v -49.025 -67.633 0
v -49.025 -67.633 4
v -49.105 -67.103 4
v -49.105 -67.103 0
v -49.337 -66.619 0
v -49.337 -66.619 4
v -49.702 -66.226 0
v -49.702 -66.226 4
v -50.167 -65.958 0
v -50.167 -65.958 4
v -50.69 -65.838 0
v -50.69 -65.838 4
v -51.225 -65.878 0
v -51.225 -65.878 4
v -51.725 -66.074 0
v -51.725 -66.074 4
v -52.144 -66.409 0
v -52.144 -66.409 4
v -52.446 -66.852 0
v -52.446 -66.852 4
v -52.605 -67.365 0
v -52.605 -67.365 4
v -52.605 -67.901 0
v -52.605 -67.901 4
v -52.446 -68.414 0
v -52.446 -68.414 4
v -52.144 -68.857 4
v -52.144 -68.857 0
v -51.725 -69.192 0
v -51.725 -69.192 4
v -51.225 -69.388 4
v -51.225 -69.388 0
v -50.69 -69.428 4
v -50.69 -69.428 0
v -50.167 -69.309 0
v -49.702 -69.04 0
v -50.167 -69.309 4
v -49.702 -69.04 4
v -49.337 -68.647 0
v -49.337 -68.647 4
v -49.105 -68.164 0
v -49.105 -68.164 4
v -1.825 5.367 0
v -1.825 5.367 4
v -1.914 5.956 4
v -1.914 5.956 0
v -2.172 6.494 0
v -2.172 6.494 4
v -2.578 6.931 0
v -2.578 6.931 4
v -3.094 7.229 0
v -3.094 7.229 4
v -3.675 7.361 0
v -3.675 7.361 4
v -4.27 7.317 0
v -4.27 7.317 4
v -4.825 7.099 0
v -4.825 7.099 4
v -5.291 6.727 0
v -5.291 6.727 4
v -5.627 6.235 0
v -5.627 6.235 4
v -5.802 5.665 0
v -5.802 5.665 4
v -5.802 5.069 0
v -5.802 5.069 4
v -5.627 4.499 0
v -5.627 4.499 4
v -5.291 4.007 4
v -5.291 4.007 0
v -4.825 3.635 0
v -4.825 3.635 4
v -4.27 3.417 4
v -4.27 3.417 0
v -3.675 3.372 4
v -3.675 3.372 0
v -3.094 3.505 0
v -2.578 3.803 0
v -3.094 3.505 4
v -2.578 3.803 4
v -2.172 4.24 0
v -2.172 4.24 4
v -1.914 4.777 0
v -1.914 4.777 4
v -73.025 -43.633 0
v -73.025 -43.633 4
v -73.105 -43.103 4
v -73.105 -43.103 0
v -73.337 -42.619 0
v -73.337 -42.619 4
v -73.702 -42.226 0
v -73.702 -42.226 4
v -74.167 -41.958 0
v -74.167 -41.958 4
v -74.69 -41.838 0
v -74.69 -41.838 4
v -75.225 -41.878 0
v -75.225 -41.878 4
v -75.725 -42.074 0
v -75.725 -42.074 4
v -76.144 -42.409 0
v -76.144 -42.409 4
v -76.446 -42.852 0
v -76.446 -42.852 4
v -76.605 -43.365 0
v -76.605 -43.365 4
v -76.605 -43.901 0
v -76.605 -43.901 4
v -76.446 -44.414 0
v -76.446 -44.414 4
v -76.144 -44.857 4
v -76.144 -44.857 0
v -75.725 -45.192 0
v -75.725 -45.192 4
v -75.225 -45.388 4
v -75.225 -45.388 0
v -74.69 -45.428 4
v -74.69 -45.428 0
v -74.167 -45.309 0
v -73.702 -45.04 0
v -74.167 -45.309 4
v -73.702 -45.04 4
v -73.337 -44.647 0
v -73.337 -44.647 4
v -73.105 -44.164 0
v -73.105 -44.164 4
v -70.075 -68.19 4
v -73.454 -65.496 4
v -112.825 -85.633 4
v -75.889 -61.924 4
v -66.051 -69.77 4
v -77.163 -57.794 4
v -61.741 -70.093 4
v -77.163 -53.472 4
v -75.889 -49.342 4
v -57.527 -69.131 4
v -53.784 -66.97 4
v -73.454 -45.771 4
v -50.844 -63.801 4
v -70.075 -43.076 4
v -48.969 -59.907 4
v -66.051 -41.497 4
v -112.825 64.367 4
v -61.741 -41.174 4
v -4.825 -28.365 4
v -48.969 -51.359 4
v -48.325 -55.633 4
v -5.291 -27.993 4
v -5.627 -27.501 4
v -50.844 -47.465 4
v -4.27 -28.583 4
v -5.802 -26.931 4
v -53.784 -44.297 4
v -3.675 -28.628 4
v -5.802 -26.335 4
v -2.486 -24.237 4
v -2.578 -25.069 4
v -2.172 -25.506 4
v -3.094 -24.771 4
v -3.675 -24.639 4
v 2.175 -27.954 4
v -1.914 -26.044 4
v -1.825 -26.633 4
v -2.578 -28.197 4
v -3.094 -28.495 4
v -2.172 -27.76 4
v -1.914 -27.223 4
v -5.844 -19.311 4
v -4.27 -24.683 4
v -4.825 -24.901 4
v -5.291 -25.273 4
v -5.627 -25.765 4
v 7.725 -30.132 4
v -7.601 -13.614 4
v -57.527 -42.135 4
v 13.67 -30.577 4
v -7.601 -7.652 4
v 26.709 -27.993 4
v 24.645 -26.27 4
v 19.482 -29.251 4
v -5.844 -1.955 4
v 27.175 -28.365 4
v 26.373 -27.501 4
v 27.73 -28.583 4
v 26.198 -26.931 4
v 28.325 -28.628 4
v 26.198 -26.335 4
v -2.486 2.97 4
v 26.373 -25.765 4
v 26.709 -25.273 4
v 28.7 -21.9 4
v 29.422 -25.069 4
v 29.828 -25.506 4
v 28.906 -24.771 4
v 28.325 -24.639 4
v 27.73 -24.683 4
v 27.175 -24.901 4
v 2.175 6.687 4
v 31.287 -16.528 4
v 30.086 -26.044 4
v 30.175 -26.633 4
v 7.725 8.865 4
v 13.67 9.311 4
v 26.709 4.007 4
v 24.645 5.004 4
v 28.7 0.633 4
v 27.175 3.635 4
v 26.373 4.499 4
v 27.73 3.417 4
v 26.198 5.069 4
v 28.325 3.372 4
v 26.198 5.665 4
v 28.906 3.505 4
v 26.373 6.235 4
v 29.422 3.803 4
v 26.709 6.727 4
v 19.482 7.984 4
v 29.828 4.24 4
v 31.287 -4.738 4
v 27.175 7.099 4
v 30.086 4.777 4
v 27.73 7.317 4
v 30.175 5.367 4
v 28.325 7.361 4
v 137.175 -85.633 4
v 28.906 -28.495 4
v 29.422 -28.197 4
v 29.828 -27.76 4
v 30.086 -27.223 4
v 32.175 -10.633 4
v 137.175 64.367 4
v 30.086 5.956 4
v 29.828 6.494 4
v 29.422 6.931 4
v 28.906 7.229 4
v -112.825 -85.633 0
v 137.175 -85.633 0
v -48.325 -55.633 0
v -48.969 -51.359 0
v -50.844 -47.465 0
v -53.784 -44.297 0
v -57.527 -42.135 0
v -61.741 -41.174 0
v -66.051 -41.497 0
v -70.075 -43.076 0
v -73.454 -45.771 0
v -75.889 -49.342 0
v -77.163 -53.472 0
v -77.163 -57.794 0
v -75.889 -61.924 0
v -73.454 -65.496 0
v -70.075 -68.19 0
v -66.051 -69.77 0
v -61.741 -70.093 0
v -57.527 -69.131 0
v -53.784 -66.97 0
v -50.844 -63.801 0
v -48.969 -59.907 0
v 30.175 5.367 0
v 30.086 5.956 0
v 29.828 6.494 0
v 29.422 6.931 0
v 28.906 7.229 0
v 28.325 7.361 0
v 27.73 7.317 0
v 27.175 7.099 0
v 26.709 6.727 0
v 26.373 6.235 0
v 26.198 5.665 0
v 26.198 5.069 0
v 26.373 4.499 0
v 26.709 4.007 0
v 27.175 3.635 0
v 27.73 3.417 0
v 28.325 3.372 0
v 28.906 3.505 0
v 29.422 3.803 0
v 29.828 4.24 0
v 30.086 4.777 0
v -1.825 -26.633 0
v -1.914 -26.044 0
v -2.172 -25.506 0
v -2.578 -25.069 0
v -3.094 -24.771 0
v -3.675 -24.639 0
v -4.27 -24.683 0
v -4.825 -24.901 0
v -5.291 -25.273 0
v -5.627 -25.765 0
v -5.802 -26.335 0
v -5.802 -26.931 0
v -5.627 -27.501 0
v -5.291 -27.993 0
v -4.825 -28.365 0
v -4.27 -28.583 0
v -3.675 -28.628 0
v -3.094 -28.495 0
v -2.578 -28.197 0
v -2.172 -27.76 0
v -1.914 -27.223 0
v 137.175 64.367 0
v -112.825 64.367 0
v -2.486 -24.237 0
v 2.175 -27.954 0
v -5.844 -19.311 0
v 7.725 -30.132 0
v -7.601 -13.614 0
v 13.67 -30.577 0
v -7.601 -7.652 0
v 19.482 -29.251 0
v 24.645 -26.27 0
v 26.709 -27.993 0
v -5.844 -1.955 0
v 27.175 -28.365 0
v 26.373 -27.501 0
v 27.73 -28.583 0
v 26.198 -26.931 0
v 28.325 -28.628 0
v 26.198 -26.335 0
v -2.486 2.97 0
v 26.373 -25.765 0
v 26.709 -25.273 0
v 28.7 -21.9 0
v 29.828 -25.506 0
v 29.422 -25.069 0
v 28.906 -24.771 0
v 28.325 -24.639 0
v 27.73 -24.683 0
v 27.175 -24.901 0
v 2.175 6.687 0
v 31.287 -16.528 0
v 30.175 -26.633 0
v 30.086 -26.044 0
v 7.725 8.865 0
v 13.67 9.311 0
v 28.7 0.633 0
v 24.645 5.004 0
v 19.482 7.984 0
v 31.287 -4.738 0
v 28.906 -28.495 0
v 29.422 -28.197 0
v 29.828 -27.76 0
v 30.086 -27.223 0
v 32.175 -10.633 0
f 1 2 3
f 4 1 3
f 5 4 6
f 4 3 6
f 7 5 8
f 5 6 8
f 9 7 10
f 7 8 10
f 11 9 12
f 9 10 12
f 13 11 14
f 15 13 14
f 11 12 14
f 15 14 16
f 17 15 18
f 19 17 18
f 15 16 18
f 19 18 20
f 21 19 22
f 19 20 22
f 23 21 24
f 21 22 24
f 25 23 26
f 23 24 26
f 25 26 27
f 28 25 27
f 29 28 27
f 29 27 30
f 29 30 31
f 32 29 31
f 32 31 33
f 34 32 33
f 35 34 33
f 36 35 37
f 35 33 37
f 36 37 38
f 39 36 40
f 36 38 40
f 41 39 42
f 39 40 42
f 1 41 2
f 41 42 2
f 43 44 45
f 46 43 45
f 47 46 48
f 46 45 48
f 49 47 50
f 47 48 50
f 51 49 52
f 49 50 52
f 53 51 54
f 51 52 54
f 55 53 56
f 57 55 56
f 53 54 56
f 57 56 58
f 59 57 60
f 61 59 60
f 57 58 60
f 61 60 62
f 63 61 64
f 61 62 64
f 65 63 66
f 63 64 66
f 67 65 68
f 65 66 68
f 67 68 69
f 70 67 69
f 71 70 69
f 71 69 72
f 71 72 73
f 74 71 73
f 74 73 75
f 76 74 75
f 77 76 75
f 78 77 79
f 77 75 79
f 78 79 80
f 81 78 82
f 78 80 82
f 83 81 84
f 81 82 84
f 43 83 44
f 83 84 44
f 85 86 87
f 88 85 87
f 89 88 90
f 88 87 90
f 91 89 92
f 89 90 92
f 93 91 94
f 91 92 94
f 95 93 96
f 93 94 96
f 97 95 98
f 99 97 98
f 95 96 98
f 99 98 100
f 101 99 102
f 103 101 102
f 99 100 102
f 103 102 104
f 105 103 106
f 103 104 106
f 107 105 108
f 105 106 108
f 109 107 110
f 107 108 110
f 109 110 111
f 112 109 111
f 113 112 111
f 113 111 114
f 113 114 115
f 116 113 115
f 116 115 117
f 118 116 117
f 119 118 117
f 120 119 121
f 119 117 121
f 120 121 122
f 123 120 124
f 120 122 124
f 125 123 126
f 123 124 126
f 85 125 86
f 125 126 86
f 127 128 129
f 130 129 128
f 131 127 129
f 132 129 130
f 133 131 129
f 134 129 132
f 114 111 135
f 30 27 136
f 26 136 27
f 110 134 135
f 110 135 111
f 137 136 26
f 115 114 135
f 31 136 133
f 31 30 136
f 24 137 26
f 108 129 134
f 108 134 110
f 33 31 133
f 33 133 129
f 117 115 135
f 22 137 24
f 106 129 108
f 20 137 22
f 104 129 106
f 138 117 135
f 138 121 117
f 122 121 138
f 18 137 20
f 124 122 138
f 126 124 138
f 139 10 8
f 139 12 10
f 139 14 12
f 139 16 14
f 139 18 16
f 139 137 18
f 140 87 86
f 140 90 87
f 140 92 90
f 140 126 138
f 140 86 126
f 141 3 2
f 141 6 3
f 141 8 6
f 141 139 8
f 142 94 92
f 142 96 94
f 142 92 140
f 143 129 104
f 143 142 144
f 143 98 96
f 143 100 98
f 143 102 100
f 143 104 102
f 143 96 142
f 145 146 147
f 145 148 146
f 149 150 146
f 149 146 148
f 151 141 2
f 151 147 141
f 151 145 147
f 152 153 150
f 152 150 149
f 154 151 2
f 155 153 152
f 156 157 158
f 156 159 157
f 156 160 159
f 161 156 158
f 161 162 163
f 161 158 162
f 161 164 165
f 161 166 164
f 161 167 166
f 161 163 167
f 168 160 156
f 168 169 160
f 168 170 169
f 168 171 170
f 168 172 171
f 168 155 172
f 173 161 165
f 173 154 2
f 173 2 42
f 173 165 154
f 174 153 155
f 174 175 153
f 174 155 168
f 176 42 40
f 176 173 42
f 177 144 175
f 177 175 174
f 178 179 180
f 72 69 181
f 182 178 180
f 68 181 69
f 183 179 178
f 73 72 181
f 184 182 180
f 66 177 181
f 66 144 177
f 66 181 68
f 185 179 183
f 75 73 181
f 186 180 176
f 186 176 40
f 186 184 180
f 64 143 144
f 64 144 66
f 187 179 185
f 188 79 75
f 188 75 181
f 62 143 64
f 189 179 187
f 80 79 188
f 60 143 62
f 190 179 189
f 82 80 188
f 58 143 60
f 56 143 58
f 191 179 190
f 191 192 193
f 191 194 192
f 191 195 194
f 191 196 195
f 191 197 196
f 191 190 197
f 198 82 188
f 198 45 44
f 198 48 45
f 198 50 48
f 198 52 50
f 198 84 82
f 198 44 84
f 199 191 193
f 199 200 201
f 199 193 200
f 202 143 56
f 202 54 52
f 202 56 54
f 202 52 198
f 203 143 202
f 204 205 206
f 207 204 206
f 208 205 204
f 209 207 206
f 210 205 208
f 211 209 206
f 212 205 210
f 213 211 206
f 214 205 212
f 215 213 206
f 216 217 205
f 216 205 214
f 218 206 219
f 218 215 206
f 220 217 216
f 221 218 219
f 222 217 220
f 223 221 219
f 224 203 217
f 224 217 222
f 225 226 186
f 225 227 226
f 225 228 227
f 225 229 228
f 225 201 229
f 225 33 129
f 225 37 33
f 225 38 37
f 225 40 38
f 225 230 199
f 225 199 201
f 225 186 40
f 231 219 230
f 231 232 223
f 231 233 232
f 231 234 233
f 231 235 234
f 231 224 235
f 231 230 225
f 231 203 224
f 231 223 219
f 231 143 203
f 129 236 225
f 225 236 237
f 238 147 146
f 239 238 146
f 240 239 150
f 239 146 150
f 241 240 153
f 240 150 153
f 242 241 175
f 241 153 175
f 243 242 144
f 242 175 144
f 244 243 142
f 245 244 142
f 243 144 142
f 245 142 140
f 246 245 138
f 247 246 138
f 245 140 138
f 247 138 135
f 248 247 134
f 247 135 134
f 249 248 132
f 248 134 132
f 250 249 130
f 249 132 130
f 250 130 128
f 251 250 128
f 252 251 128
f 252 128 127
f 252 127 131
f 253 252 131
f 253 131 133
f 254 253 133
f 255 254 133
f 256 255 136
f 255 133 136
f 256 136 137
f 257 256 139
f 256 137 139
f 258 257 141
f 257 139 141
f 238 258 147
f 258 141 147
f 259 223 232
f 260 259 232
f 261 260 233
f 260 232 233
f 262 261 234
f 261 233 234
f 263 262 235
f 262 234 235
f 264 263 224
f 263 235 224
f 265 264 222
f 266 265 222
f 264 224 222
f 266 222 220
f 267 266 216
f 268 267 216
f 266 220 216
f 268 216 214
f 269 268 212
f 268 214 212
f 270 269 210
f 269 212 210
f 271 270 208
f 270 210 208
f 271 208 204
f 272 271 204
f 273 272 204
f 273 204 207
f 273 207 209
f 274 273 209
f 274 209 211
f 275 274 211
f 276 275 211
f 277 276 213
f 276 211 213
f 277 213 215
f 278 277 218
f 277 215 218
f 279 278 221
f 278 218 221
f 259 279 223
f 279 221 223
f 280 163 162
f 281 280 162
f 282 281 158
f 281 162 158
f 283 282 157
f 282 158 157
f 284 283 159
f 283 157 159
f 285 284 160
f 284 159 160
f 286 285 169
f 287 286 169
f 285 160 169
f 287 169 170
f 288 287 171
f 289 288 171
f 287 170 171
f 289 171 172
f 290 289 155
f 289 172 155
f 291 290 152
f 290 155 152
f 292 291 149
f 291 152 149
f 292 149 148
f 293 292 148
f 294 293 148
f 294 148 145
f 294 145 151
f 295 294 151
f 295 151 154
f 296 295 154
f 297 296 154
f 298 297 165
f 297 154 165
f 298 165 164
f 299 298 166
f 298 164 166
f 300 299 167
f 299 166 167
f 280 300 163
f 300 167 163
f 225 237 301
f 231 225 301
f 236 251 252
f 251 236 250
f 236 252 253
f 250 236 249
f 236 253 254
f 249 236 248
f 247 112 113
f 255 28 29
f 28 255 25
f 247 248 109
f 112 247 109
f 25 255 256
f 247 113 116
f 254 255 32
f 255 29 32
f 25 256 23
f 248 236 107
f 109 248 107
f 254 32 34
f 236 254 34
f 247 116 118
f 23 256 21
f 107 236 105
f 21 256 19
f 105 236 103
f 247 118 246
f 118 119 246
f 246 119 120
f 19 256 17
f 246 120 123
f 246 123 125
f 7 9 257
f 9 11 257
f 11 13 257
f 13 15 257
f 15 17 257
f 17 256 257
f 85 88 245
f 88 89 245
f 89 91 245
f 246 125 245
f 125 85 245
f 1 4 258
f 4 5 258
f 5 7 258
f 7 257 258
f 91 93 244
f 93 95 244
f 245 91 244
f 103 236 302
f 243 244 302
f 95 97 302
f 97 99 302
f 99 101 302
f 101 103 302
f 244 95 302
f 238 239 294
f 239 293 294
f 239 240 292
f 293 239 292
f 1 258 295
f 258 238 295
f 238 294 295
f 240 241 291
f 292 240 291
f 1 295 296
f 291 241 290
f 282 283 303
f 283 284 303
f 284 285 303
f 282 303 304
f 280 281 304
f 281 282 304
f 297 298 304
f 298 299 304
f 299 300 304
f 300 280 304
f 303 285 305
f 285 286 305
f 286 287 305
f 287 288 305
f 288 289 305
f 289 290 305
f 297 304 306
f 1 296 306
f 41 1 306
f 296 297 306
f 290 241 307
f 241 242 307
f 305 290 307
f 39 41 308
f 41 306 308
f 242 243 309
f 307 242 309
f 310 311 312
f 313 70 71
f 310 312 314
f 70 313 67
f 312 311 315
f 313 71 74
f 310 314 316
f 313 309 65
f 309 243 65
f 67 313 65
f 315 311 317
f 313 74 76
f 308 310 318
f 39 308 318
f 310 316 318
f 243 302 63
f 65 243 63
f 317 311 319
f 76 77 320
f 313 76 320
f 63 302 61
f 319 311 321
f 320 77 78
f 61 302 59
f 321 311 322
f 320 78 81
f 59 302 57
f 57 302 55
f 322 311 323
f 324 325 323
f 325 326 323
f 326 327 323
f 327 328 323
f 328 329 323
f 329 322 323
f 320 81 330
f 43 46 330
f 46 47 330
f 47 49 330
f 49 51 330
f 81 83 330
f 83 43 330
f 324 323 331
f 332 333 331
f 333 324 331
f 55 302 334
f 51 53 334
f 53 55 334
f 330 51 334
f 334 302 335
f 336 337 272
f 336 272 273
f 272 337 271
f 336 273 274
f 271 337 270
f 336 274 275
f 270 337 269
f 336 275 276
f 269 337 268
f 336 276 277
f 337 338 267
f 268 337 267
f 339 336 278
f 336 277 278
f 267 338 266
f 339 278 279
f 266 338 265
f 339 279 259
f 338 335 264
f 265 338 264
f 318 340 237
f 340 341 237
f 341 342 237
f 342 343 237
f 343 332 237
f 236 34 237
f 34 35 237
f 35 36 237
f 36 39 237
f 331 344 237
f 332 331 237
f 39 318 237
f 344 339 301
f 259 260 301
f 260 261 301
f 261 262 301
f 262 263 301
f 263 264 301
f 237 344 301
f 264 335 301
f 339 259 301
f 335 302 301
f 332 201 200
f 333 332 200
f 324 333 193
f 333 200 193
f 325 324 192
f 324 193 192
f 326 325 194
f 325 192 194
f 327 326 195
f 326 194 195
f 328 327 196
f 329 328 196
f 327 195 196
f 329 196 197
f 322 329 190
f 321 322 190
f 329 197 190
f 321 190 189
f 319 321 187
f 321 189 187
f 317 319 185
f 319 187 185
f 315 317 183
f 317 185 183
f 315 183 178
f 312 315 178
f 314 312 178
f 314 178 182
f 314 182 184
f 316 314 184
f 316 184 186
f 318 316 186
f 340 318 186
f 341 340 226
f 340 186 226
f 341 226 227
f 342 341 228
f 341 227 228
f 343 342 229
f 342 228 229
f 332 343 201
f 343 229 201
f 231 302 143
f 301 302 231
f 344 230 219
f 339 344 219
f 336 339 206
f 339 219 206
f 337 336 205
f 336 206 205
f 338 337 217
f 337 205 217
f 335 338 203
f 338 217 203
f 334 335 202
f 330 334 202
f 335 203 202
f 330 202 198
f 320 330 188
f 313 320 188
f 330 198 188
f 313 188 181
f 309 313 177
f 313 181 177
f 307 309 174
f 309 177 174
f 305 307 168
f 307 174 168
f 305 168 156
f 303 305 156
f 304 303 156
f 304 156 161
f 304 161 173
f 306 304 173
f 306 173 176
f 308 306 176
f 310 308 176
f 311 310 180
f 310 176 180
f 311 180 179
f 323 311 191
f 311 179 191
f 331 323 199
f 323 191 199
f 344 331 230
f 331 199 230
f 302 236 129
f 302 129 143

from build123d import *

# Parameters (mm, degrees)
SKETCH1_W           = 250
SKETCH1_H           = 150
BOSS_EXTRUDE1_DEPTH = 4
SKETCH2_R           = 20
CUT_EXTRUDE1_DEPTH  = 4
SKETCH3_R           = 2
CUT_EXTRUDE2_DEPTH  = 4
SKETCH4_R           = 14.5
SKETCH4_R_2         = 1.8
CUT_EXTRUDE4_DEPTH  = 4


with BuildPart() as part:
    # Sketch1 → Boss-Extrude1 (new body)
    with BuildSketch(Plane.XY):
        with Locations((12.175324675, -10.633116883)):
            Rectangle(SKETCH1_W, SKETCH1_H)
    extrude(amount=BOSS_EXTRUDE1_DEPTH)

    # Sketch2 → Cut-Extrude1 (cut)
    with BuildSketch(Plane.XY.offset(4)):
        with Locations((12.175324675, -10.633116883)):
            Circle(SKETCH2_R)
    extrude(amount=-CUT_EXTRUDE1_DEPTH, mode=Mode.SUBTRACT)

    # Sketch3 → Cut-Extrude2 (cut)
    with BuildSketch(Plane.XY.offset(4)):
        with Locations((-3.824675325, 5.366883117)):
            Circle(SKETCH3_R)
        with Locations((28.175324675, 5.366883117)):
            Circle(SKETCH3_R)
        with Locations((28.175324675, -26.633116883)):
            Circle(SKETCH3_R)
        with Locations((-3.824675325, -26.633116883)):
            Circle(SKETCH3_R)
    extrude(amount=-CUT_EXTRUDE2_DEPTH, mode=Mode.SUBTRACT)

    # Sketch4 → Cut-Extrude4 (cut)
    with BuildSketch(Plane.XY.offset(4)):
        with Locations((-62.824675325, -55.633116883)):
            Circle(SKETCH4_R)
        with Locations((-74.824675325, -43.633116883)):
            Circle(SKETCH4_R_2)
        with Locations((-50.824675325, -67.633116883)):
            Circle(SKETCH4_R_2)
    extrude(amount=-CUT_EXTRUDE4_DEPTH, mode=Mode.SUBTRACT)


solid = part.part
